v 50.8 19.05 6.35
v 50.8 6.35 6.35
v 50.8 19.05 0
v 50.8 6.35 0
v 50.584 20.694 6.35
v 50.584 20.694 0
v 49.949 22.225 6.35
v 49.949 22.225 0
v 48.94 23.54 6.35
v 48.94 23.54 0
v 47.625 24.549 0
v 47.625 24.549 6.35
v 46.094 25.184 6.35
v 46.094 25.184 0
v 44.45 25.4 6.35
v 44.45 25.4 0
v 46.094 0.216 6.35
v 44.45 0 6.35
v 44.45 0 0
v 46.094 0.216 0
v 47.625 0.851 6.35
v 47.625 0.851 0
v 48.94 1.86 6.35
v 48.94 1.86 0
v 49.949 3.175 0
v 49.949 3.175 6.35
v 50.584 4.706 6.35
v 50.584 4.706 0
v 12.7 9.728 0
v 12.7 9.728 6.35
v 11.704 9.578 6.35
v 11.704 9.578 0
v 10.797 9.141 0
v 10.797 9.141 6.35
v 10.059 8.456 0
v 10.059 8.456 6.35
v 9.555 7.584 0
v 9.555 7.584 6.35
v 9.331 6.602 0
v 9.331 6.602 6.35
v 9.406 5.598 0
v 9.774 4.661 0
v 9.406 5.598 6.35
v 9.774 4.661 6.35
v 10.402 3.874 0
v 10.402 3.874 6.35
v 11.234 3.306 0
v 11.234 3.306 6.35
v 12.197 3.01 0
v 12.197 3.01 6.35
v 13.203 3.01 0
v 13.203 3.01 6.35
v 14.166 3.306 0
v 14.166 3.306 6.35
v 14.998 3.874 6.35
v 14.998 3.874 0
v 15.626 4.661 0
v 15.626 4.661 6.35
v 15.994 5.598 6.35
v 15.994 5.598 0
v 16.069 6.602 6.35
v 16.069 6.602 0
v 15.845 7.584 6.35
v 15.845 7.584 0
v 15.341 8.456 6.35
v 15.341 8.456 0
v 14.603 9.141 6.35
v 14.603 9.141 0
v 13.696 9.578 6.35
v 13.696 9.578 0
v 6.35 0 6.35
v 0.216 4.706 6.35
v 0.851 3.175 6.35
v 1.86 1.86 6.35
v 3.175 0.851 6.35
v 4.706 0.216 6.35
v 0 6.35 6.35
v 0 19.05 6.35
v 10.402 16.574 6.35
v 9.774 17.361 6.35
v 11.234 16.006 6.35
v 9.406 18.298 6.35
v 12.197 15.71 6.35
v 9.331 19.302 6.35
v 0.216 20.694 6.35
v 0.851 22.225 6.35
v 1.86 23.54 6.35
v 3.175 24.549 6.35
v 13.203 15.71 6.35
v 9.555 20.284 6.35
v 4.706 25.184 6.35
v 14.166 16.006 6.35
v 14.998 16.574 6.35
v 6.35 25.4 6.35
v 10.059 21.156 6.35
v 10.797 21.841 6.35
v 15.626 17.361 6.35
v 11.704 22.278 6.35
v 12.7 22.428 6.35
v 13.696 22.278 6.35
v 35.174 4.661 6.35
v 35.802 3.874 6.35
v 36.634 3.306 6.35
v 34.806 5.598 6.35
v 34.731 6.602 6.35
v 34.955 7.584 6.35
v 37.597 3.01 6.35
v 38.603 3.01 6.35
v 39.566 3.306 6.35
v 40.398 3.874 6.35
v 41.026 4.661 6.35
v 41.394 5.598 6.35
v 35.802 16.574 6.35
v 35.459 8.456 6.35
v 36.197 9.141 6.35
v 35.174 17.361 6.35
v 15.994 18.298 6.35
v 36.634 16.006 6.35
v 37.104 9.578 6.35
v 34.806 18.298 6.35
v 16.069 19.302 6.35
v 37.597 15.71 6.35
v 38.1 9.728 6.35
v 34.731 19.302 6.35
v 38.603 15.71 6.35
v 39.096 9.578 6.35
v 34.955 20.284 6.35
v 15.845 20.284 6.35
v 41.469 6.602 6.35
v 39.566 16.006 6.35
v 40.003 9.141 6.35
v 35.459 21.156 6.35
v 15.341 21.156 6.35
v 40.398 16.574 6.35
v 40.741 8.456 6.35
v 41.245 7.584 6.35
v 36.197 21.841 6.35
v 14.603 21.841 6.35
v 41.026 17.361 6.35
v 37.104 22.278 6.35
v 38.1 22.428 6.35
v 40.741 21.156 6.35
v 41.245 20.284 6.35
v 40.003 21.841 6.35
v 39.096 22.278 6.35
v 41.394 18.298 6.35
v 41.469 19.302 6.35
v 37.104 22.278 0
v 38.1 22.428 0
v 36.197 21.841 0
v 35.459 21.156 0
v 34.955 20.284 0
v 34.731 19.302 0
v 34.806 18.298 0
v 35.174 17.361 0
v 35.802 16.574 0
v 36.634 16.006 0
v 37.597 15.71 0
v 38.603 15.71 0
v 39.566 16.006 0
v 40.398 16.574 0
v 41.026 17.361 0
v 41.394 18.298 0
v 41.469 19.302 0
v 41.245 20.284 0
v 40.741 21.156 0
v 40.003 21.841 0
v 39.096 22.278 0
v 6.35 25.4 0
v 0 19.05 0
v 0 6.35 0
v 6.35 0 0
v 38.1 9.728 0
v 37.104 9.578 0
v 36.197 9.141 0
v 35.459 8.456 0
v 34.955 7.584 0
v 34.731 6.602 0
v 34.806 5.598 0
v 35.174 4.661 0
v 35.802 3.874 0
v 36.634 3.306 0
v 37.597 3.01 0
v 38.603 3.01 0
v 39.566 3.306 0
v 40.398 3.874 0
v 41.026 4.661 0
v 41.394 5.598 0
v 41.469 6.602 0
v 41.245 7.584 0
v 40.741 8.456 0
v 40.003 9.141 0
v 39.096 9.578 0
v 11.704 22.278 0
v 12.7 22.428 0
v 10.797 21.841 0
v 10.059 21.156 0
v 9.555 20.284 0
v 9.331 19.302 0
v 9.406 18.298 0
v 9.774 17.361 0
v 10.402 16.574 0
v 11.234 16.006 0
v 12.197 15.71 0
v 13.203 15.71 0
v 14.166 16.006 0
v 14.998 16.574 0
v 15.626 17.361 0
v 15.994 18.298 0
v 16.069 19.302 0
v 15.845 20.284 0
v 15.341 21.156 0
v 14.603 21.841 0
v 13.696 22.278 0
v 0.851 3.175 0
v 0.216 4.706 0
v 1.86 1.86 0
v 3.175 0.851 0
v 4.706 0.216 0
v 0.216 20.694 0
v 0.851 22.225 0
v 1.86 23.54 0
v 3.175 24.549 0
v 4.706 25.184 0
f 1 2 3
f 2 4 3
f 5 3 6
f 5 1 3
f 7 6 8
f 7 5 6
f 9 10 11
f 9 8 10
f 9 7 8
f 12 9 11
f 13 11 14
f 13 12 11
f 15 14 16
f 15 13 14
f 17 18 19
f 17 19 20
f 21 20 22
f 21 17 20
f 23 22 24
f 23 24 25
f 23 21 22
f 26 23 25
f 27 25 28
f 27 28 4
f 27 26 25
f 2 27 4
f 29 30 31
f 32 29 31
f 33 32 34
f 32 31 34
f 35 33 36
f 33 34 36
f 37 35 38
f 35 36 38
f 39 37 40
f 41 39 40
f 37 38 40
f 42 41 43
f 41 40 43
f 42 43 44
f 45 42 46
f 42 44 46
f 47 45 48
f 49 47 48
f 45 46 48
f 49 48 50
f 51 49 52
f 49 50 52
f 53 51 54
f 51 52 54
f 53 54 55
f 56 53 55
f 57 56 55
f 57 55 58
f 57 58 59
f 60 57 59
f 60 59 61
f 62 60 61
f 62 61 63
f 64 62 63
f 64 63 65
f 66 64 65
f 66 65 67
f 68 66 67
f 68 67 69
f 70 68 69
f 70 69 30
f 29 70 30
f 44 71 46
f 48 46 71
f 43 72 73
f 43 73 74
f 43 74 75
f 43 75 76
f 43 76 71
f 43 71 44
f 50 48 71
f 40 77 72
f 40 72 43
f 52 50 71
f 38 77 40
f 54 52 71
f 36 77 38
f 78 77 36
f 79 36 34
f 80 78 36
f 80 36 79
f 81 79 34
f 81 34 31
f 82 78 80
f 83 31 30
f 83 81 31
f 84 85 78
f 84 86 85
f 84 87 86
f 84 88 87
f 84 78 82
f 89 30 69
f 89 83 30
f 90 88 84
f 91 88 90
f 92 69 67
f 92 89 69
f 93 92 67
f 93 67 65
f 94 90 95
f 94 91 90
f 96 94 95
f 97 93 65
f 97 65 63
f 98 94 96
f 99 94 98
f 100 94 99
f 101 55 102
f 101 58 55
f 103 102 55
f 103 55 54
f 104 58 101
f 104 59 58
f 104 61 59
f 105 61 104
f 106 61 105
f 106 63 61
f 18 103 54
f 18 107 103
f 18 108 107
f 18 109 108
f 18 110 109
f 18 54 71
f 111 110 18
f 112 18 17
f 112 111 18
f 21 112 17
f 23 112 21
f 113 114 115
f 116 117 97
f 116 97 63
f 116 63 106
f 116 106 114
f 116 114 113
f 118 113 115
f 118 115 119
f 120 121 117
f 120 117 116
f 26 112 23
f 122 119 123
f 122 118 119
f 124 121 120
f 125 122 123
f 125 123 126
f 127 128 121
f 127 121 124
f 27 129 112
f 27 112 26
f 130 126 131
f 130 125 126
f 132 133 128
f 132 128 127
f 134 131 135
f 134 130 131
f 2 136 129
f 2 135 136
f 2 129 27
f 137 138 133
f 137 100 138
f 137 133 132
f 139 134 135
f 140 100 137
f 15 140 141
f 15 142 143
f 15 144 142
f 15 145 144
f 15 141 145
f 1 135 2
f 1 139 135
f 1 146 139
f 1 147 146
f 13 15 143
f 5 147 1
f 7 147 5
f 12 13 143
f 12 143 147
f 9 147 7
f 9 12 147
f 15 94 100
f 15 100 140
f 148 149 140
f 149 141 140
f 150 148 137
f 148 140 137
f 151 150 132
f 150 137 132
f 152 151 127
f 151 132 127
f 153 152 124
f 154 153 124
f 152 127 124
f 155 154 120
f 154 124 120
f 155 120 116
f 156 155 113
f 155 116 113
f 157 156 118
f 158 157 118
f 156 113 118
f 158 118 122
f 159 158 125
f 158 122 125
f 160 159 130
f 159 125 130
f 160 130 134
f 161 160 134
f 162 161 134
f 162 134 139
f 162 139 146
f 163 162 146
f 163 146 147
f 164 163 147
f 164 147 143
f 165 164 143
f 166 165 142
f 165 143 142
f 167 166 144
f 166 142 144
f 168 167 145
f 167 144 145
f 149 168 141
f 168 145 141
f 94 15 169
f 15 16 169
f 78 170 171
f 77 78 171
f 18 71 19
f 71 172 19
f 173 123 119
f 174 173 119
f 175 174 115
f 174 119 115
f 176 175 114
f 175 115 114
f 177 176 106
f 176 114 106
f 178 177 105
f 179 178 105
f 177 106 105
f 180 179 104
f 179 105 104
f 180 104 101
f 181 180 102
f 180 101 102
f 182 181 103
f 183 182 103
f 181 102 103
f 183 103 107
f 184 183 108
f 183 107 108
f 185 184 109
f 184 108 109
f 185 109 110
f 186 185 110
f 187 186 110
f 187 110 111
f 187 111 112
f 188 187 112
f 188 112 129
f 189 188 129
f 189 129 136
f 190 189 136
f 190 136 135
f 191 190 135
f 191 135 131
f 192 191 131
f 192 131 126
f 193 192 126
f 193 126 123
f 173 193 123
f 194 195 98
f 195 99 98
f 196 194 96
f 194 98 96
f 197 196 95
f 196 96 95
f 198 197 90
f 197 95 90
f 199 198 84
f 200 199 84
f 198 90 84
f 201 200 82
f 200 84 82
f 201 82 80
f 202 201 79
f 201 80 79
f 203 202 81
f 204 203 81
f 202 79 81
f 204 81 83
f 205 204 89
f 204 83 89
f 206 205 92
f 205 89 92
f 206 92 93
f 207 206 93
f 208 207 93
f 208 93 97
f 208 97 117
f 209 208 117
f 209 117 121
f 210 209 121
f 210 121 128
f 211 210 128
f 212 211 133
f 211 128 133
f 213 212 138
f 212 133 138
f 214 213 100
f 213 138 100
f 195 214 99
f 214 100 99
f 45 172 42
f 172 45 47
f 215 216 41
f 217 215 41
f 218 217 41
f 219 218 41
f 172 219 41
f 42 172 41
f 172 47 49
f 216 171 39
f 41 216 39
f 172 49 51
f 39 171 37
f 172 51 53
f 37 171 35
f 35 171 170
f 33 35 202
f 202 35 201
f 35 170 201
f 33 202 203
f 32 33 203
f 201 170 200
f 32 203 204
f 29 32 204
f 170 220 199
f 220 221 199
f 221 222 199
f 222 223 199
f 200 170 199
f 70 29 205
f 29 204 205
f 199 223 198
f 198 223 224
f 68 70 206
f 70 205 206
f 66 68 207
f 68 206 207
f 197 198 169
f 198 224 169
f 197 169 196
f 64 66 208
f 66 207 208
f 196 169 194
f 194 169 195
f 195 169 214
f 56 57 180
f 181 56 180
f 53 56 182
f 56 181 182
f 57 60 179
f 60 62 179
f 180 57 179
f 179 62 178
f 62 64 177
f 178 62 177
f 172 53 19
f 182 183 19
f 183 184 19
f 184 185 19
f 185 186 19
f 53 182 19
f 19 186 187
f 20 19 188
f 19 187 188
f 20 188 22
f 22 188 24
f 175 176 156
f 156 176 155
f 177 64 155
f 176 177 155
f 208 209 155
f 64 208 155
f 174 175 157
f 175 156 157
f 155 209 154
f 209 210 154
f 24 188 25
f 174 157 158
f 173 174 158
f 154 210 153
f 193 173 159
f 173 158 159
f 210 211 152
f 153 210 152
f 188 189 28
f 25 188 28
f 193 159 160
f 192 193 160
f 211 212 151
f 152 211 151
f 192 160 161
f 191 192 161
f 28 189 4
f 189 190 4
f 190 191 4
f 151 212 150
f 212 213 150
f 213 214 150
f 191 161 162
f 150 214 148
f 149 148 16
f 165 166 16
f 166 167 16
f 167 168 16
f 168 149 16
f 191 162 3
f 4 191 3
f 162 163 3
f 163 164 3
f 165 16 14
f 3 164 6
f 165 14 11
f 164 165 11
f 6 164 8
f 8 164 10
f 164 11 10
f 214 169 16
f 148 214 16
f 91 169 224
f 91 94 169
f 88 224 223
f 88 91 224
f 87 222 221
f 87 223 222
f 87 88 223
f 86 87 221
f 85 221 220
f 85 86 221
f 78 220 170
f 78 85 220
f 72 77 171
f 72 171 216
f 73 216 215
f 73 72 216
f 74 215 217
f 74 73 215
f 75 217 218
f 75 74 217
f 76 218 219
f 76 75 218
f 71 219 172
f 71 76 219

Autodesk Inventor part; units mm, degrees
ref_plane "YZ Plane" through (0, 0, 0) normal (1, 0, 0) x (0, 1, 0)
ref_plane "XZ Plane" through (0, 0, 0) normal (0, 1, 0) x (-1, 0, 0)
ref_plane "XY Plane" through (0, 0, 0) normal (0, 0, 1) x (1, 0, 0)
sketch "Sketch1" plane through (0, 0, 0) normal (0, 0, 1) x (1, 0, 0)
  line L0 (0, 0) -> (50.8, 0)
  line L1 (50.8, 0) -> (50.8, 25.4)
  line L2 (50.8, 25.4) -> (0, 25.4)
  line L3 (0, 25.4) -> (0, 0)
  line L4 (25.4, 12.7) -> (25.4, 19.05)
  line L5 (25.4, 19.05) -> (38.1, 19.05)
  line L6 (38.1, 19.05) -> (12.7, 19.05)
  line L7 (12.7, 19.05) -> (12.7, 6.35)
  line L8 (12.7, 6.35) -> (38.1, 6.35)
  dimension "d0" = 50.8
  dimension "d1" = 25.4
  dimension "d2" = 6.35
  dimension "d3" = 12.7
  dimension "d4" = 25.4
  dimension "d5" = 12.7
  dimension "d6" = 25.4
extrude "Extrusion1" add sketch "Sketch1" along normal blind 6.35
hole "Hole1" at (38.1, 19.05, 0) at (38.1, 6.35, 0) at (12.7, 6.35, 0) at (12.7, 19.05, 0) direction (0, 0, 1) diameter 6.7564 end through all clearance for "Socket Head Cap Screw" size "1/4" standard "Ansi Unified Screw Threads"
fillet "Fillet1" radius 6.35 4 edges at (50.8, 25.4, 3.175) (50.8, 0, 3.175) (0, 25.4, 3.175) (0, 0, 3.175)
properties part number "WellPlateFrame-AssemblyClip"
